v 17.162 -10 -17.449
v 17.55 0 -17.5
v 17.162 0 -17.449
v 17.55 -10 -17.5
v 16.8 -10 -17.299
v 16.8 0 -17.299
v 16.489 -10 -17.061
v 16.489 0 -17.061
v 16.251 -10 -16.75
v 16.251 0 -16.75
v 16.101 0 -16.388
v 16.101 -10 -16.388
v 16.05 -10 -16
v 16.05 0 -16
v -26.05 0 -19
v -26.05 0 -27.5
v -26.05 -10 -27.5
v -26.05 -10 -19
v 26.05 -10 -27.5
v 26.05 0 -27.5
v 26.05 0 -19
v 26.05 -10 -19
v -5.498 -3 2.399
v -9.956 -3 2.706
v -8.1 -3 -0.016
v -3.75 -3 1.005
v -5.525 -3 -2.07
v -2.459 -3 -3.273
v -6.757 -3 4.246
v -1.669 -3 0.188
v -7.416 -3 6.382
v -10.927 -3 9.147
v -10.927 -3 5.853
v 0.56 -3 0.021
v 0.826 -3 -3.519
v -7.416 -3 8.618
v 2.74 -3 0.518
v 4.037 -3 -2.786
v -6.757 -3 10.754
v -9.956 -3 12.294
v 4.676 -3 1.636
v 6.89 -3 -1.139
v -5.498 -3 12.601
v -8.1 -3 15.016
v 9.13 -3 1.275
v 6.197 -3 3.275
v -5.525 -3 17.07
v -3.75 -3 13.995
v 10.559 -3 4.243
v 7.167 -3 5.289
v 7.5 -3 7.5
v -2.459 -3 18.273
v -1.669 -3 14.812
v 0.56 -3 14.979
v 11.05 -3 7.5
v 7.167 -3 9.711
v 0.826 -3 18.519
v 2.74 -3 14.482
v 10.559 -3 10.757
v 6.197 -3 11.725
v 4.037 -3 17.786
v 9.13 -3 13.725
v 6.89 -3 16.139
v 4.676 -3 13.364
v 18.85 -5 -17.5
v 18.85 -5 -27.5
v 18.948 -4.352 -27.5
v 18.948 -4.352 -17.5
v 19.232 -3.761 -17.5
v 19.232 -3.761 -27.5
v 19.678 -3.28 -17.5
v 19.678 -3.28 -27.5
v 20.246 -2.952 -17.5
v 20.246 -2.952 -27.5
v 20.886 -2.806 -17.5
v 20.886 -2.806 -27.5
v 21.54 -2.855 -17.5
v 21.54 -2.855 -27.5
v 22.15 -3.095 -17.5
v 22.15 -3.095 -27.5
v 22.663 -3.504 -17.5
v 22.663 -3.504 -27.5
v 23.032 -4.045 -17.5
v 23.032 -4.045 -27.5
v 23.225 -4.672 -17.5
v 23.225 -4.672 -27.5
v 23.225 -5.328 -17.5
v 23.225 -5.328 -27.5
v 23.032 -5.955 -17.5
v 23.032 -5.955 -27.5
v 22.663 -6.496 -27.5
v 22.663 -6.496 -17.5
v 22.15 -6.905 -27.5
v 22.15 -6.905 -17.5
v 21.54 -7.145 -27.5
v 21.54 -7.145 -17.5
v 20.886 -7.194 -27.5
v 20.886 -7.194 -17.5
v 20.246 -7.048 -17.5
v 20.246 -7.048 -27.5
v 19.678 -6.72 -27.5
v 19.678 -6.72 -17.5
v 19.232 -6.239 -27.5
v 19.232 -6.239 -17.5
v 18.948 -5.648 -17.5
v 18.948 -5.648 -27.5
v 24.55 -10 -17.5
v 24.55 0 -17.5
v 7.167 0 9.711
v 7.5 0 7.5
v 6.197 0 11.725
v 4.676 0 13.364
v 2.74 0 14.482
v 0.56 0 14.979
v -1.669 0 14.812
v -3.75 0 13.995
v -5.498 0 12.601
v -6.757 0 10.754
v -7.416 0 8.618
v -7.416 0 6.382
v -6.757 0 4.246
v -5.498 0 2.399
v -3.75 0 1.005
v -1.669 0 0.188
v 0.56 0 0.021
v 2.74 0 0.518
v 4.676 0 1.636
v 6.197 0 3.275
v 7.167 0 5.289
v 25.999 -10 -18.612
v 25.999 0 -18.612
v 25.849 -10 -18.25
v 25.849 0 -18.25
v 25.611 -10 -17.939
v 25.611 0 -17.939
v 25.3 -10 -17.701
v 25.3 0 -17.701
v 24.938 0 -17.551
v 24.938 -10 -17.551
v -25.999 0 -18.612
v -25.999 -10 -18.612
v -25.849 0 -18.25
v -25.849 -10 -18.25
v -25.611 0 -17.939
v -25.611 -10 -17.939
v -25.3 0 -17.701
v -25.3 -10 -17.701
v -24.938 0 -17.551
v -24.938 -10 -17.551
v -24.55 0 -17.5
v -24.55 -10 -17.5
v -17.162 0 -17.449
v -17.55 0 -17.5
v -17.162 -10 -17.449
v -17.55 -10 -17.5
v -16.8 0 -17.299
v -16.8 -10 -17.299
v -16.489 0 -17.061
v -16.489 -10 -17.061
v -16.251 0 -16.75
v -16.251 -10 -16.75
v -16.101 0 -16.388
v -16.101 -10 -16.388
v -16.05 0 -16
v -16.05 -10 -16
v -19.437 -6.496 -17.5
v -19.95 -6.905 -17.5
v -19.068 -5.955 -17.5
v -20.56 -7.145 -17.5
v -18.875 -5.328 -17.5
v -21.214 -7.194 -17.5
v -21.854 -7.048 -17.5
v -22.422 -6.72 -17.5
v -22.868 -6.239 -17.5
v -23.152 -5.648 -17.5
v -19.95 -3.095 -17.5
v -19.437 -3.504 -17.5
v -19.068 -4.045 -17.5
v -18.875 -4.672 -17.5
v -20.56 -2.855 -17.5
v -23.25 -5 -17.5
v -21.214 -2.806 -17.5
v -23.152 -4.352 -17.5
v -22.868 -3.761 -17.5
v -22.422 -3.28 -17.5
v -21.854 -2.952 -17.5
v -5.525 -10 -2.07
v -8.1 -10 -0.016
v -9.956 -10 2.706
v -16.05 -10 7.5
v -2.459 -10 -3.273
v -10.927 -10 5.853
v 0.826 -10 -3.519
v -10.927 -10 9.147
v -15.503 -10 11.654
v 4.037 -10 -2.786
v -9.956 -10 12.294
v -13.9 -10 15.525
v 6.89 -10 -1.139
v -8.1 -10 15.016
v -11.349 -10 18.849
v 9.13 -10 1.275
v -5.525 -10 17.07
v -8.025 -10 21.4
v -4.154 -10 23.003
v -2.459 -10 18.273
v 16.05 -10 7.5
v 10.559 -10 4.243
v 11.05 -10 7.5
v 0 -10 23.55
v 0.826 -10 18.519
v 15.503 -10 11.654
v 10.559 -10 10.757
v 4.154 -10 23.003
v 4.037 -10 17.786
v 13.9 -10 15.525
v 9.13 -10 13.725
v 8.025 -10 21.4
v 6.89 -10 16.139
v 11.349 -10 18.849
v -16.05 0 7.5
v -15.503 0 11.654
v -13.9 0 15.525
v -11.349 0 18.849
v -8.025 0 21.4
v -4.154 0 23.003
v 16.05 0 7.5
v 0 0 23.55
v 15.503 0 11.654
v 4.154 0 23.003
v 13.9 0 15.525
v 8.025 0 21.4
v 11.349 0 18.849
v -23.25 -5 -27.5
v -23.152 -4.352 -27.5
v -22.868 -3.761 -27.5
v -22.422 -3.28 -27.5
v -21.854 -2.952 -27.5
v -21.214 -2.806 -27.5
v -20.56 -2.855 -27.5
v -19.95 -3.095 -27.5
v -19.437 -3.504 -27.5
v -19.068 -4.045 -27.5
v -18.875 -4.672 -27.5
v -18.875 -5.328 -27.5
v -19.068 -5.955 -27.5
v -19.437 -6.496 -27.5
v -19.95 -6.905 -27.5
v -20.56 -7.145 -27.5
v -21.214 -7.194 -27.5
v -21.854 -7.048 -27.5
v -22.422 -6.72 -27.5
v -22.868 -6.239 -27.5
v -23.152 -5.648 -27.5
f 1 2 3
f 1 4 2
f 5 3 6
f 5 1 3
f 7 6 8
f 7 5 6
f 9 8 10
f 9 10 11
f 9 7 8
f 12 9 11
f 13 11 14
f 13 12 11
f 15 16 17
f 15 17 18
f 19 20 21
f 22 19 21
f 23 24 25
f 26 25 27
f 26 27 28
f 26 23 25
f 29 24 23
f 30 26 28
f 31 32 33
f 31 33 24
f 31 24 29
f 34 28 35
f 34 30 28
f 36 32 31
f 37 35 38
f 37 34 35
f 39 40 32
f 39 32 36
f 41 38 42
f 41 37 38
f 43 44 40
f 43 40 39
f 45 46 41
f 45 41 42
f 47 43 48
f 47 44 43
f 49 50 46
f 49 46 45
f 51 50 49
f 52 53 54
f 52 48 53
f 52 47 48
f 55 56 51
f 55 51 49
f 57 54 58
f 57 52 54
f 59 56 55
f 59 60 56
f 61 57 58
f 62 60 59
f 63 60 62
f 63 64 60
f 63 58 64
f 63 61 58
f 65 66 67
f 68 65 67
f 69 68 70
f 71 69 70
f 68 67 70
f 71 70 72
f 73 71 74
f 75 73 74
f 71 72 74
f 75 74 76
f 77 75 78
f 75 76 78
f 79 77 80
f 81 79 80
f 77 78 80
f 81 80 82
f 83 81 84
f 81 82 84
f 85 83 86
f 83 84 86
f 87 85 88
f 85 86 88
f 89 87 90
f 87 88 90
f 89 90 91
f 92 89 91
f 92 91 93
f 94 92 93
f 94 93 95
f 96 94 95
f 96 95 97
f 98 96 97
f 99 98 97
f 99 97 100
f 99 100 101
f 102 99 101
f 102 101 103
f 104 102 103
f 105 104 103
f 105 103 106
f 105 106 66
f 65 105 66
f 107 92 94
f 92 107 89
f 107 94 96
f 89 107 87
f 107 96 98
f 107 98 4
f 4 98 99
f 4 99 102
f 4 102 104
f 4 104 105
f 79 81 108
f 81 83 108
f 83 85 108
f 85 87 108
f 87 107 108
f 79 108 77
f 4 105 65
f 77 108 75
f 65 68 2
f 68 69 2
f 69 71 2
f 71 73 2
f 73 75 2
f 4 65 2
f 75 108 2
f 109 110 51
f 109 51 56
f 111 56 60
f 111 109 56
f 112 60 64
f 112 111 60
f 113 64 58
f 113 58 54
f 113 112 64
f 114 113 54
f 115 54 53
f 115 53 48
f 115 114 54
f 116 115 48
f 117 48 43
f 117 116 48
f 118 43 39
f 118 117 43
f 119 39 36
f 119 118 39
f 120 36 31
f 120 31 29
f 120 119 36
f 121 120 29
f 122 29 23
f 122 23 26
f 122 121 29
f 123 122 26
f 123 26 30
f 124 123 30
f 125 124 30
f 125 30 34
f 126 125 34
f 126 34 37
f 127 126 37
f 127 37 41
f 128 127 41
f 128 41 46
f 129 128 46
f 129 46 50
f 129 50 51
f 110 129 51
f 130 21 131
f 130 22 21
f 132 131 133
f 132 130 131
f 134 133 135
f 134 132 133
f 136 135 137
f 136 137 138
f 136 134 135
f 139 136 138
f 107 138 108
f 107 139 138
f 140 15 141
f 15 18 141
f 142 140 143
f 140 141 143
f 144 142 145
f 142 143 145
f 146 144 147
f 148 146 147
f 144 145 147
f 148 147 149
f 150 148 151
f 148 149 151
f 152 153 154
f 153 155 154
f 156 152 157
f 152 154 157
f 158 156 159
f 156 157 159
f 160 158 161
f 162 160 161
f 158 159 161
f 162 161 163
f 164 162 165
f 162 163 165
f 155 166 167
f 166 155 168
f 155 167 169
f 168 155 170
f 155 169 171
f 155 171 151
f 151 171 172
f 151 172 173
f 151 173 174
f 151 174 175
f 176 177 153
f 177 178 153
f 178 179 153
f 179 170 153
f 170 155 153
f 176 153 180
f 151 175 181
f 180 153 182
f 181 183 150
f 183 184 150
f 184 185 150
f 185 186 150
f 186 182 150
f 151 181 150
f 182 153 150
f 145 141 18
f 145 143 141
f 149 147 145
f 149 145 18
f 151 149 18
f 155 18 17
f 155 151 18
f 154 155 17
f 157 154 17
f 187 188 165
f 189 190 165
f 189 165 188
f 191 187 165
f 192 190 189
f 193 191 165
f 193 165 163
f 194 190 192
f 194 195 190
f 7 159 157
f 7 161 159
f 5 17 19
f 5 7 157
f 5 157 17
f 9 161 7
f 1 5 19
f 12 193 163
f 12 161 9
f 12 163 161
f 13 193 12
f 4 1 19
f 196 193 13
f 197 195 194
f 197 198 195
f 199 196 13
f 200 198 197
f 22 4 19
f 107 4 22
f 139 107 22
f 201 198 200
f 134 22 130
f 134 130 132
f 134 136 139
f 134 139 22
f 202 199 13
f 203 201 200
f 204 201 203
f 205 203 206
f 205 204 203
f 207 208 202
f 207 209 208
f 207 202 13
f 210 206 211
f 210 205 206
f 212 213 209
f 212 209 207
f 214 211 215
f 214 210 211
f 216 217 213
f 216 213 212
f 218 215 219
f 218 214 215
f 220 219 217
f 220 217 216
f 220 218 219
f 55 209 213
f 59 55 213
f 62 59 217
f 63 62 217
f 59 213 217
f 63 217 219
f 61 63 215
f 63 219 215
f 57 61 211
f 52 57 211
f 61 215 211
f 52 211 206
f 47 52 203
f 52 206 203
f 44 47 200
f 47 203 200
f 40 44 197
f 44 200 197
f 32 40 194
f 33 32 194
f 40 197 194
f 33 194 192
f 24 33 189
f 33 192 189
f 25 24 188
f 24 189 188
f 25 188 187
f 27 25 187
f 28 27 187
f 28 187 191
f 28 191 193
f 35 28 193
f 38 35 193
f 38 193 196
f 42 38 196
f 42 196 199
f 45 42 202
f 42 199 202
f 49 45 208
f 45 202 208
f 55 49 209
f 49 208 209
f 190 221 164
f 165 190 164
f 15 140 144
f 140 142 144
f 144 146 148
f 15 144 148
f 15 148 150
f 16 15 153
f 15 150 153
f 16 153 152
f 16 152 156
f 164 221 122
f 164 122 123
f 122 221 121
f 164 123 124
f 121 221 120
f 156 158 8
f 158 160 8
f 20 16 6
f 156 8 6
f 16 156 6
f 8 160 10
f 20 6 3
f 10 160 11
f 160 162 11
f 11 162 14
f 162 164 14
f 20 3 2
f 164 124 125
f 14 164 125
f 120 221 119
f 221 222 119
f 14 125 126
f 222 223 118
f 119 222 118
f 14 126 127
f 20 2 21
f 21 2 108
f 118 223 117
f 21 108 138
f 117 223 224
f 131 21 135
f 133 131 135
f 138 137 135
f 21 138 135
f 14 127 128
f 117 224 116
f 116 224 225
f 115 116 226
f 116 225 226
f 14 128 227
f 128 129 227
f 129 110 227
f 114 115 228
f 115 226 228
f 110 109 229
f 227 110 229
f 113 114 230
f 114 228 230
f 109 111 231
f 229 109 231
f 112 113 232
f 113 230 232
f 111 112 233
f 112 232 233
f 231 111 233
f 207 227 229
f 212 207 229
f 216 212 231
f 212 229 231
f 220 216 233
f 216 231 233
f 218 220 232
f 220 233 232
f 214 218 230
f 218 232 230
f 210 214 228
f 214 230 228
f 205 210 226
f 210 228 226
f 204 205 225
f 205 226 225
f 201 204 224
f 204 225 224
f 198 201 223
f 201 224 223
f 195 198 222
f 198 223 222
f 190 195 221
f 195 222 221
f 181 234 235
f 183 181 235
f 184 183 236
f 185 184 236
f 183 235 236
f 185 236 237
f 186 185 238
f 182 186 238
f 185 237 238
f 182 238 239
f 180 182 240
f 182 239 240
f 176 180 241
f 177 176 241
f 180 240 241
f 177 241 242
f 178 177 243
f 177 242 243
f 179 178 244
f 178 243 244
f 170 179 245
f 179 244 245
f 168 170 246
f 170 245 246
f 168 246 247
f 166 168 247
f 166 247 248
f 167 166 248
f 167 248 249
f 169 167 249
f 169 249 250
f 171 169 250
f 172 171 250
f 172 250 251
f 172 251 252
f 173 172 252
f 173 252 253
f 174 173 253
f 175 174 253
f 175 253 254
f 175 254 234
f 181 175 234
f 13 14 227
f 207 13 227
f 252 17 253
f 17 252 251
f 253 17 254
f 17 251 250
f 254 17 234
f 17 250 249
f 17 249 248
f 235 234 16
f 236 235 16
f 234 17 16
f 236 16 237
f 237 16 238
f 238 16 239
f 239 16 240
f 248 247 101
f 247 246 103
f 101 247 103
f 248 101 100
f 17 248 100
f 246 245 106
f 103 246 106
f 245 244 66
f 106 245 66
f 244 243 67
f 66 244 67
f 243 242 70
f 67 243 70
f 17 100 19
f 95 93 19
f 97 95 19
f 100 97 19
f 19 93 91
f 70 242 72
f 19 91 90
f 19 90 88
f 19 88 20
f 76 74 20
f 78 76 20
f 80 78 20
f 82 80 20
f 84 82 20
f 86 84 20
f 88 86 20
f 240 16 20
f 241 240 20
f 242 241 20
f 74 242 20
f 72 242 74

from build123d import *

# Parameters (mm, degrees)
F0_W     = 10
F0_H     = 10
F0_W_2   = 32.1
F0_R     = 11.05
F0_R_2   = 7.5
F1_DEPTH = 10
F2_R     = 11.05
F2_R_2   = 7.5
F3_DEPTH = 7
F5_D     = 4.4
F6_R     = 1.5


with BuildPart() as f1:
    # F0 (on Front) → F1 (new body)
    with BuildSketch(Plane.XZ):
        with Locations((-21.05, -22.5)):
            Rectangle(F0_W, F0_H)
        with Locations((0, -22.5)):
            Rectangle(F0_W_2, F0_H)
        with Locations((21.05, -22.5)):
            Rectangle(F0_W, F0_H)
        with BuildLine():
            Line((-16.05, 7.5), (-16.05, -17.5))
            Line((-16.05, -17.5), (16.05, -17.5))
            Line((16.05, -17.5), (16.05, 7.5))
            ThreePointArc((16.05, 7.5), (0, 23.55), (-16.05, 7.5))
        make_face()
        with Locations((0, 7.5)):
            Circle(F0_R, mode=Mode.SUBTRACT)
        with Locations((0, 7.5)):
            Circle(F0_R)
        with Locations((0, 7.5)):
            Circle(F0_R_2, mode=Mode.SUBTRACT)
    extrude(amount=F1_DEPTH)

    # F2 (on face) → F3 (cut)
    with BuildSketch(Plane.XZ.offset(10)):
        with Locations((0, 7.5)):
            Circle(F2_R)
        with Locations((0, 7.5)):
            Circle(F2_R_2, mode=Mode.SUBTRACT)
    extrude(amount=-F3_DEPTH, mode=Mode.SUBTRACT)

    # F5 (through all)
    with Locations(Plane.XY.offset(-17.5)):
        with Locations((-21.05, -5), (21.05, -5)):
            Hole(F5_D / 2)

    # F6
    f6_edges = [f1.edges().sort_by_distance(p)[0] for p in [
        (-16.05, -5, -17.5),
        (-26.05, -5, -17.5),
        (16.05, -5, -17.5),
        (26.05, -5, -17.5),
    ]]
    fillet(f6_edges, radius=F6_R)


solid = f1.part
